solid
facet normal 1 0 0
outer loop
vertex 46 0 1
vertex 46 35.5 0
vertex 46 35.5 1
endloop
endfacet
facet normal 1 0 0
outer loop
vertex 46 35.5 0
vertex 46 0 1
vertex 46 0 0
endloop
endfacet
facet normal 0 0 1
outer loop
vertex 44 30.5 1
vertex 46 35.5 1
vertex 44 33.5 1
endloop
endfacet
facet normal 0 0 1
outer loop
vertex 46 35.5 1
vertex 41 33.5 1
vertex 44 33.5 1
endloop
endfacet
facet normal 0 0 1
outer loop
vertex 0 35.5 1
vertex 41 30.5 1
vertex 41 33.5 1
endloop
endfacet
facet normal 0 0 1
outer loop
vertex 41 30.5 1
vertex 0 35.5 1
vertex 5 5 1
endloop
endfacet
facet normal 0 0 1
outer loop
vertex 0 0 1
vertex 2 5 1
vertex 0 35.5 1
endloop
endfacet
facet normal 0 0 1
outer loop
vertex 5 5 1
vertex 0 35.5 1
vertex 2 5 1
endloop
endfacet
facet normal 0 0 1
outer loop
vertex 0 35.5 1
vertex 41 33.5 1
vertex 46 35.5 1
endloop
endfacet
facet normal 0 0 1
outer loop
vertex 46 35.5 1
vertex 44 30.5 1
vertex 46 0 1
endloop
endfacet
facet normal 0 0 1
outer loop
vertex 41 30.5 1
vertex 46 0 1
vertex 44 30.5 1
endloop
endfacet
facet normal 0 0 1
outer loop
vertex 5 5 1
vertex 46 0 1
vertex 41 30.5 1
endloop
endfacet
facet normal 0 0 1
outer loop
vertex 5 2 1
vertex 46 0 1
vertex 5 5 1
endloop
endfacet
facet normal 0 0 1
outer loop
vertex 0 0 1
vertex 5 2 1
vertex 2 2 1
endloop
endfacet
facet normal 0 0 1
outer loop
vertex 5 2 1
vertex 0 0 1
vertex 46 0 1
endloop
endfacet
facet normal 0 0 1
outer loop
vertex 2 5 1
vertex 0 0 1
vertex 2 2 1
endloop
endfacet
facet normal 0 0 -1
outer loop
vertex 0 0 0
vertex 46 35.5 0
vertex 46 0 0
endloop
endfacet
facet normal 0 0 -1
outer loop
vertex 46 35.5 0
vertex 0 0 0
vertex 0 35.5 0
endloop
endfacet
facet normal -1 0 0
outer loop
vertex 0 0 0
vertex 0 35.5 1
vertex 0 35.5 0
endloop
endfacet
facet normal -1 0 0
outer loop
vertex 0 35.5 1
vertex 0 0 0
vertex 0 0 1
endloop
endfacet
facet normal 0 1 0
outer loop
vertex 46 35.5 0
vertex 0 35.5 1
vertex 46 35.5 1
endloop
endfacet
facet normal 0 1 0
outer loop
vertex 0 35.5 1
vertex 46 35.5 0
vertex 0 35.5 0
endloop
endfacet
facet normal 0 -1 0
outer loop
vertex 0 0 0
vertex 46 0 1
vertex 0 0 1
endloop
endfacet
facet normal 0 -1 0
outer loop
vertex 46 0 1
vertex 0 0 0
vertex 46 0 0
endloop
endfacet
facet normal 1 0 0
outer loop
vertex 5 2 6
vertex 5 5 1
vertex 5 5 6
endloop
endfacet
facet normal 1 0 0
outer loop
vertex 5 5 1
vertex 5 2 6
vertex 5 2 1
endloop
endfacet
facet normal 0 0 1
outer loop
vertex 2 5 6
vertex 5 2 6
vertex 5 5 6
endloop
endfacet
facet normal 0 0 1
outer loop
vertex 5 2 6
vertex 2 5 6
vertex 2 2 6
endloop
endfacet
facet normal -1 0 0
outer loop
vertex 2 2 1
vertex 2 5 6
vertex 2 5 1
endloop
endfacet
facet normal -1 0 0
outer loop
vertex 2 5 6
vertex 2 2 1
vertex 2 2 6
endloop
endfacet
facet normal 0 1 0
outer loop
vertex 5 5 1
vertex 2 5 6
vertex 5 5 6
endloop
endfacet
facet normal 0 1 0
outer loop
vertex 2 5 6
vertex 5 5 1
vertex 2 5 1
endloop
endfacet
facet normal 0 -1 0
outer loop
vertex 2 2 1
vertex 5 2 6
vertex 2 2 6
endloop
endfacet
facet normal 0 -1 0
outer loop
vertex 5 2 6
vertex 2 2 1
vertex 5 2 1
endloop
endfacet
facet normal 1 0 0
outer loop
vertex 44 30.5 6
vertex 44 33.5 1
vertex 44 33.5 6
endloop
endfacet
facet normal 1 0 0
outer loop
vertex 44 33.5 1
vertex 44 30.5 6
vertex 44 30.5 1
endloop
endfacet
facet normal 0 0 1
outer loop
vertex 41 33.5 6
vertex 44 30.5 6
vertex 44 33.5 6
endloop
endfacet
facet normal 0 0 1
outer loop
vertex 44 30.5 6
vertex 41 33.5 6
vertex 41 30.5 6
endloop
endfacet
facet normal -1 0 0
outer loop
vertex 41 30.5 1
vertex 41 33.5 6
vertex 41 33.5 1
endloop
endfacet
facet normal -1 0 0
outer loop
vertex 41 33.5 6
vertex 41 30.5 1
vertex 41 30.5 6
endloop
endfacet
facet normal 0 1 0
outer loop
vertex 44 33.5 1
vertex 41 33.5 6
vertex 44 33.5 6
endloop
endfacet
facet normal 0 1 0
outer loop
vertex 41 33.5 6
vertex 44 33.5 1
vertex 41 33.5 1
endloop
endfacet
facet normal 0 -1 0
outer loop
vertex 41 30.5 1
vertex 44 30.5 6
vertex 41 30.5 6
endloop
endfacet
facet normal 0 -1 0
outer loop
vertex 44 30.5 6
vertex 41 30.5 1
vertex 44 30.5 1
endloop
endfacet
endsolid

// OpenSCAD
wall = 1.5;

module cover()
{
  module corner()
  {
    cube([3,3,5]);
  }

  cube([46, 35.5, 1]);
  translate((wall+0.5)*[1,1,0] + [0, 0, 1])
    corner();
  translate([46, 35.5, 1] - (3+wall+0.5)*[1,1,0])
    corner();
}

cover();
